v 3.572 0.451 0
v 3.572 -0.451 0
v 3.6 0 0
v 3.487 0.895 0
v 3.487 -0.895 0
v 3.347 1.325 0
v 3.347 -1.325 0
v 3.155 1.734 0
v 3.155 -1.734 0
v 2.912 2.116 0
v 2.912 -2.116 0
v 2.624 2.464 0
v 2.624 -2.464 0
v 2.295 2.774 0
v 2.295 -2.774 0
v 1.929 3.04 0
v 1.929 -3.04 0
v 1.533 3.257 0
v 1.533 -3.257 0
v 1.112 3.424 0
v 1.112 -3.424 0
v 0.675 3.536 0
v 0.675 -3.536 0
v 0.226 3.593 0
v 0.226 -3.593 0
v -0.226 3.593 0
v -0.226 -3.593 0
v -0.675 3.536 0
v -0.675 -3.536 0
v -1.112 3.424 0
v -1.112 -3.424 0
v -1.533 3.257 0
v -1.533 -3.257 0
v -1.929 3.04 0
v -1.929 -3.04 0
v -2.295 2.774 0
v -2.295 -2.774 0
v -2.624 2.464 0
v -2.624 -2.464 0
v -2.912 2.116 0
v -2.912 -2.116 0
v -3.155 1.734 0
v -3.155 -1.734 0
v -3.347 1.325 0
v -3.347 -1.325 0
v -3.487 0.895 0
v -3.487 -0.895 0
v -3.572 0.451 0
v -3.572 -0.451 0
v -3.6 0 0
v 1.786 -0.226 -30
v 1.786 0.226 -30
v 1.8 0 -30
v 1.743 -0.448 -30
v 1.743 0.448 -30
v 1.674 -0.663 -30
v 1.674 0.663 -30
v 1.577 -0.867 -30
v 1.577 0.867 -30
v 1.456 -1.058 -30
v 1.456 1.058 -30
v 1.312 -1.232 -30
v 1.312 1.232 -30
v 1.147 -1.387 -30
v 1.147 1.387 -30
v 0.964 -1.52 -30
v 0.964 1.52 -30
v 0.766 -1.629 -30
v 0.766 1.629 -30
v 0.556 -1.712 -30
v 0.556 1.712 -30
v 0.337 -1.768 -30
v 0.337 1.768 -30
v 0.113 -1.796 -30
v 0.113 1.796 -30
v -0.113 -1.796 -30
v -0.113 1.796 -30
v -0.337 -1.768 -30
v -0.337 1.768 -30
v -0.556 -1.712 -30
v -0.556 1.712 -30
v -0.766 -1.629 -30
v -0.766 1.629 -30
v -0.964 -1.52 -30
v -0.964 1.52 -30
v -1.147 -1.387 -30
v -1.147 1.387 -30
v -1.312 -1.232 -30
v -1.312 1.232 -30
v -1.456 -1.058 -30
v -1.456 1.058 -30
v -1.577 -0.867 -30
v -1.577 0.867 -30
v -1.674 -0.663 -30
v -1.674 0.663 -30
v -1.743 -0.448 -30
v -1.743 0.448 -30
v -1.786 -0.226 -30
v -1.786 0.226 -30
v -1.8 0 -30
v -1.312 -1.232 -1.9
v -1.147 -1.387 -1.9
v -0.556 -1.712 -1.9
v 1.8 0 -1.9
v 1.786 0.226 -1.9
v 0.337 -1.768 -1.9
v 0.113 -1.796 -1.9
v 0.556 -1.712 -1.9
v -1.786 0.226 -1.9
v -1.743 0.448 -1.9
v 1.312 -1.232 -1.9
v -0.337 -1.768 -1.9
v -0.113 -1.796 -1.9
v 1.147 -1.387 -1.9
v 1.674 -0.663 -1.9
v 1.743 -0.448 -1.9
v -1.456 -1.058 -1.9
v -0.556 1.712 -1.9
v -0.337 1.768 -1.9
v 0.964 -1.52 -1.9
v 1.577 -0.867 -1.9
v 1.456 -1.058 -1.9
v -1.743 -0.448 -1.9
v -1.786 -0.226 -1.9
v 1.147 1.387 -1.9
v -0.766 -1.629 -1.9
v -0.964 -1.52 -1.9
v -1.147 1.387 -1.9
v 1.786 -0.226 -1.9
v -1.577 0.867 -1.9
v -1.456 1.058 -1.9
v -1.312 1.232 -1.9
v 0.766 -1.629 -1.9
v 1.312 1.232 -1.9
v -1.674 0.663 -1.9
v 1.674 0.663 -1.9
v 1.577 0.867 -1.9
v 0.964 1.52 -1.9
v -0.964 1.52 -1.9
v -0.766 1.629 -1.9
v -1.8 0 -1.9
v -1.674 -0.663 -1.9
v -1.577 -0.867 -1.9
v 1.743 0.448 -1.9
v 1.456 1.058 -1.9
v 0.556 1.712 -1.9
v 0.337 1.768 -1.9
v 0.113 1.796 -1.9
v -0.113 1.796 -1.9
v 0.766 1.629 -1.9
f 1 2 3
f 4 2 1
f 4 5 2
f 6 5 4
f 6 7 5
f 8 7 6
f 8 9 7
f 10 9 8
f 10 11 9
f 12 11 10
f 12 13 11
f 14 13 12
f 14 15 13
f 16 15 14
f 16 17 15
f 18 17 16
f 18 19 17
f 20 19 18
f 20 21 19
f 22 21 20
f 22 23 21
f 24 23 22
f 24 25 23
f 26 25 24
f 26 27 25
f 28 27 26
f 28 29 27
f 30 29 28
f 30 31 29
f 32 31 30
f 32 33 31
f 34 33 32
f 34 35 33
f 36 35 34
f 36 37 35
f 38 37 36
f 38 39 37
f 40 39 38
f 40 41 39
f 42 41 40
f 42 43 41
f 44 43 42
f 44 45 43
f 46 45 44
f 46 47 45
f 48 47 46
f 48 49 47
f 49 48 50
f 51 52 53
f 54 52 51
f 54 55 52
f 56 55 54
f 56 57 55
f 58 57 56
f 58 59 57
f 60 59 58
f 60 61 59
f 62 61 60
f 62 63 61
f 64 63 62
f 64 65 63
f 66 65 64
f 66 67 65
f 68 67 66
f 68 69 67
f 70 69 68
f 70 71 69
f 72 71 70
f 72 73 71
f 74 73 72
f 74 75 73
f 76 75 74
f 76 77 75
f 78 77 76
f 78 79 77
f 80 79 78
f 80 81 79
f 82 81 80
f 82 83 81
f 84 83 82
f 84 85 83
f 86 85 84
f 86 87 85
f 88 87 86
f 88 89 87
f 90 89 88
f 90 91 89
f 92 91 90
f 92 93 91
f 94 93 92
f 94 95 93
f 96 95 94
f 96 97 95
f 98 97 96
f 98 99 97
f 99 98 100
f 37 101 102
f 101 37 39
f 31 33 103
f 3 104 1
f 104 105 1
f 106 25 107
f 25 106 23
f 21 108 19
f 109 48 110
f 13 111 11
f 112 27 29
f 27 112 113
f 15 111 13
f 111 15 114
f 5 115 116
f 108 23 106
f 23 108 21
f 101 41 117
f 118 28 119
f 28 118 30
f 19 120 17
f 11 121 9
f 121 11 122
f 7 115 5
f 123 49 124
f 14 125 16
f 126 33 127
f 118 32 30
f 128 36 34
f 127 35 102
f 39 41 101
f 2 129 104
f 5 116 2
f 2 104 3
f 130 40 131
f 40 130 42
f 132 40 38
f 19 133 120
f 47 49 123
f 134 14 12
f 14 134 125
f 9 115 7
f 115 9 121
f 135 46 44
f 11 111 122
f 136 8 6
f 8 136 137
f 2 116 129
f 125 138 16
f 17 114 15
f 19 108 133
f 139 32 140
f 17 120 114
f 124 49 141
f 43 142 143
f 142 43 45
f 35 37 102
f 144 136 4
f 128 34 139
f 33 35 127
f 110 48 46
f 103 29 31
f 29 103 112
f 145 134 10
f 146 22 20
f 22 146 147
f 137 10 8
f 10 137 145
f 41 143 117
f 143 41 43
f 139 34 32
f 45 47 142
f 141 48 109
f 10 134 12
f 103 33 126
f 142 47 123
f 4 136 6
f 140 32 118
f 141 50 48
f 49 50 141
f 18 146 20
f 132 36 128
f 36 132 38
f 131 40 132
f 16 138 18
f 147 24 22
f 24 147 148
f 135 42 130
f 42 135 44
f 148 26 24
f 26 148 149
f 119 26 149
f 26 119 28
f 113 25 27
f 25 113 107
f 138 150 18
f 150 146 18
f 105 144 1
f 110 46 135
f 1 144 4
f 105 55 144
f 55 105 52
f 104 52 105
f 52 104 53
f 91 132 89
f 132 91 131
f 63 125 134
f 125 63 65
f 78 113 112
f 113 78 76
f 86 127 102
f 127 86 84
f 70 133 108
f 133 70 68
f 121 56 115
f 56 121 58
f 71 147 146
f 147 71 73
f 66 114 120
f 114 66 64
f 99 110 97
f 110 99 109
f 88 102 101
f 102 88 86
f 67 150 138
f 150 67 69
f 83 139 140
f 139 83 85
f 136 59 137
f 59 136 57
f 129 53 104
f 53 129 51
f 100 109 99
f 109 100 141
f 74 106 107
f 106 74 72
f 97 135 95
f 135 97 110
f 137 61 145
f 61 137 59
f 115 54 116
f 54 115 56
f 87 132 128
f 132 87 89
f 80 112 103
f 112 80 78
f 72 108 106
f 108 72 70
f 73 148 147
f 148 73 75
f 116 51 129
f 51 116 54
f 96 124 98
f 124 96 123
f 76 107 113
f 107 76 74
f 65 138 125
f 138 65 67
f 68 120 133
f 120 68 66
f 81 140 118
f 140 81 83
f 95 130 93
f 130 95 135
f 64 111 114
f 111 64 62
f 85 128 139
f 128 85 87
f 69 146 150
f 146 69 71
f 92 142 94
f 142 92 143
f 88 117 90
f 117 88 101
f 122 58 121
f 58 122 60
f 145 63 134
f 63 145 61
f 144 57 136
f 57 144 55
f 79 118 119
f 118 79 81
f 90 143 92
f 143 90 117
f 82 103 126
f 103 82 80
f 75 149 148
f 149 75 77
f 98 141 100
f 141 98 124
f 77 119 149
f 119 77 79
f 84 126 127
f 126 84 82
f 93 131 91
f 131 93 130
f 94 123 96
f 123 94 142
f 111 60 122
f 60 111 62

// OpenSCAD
$fn = 50;


difference() {
	union() {
		translate(v = [0, 0, 0]) {
			rotate(a = [0, 0, 0]) {
				difference() {
					union() {
						translate(v = [0, 0, -30.0000000000]) {
							cylinder(h = 30, r = 1.5000000000);
						}
						translate(v = [0, 0, -1.9000000000]) {
							cylinder(h = 1.9000000000, r1 = 1.8000000000, r2 = 3.6000000000);
						}
						translate(v = [0, 0, -30.0000000000]) {
							cylinder(h = 30, r = 1.8000000000);
						}
						translate(v = [0, 0, -30.0000000000]) {
							cylinder(h = 30, r = 1.5000000000);
						}
					}
					union();
				}
			}
		}
	}
	union();
}
